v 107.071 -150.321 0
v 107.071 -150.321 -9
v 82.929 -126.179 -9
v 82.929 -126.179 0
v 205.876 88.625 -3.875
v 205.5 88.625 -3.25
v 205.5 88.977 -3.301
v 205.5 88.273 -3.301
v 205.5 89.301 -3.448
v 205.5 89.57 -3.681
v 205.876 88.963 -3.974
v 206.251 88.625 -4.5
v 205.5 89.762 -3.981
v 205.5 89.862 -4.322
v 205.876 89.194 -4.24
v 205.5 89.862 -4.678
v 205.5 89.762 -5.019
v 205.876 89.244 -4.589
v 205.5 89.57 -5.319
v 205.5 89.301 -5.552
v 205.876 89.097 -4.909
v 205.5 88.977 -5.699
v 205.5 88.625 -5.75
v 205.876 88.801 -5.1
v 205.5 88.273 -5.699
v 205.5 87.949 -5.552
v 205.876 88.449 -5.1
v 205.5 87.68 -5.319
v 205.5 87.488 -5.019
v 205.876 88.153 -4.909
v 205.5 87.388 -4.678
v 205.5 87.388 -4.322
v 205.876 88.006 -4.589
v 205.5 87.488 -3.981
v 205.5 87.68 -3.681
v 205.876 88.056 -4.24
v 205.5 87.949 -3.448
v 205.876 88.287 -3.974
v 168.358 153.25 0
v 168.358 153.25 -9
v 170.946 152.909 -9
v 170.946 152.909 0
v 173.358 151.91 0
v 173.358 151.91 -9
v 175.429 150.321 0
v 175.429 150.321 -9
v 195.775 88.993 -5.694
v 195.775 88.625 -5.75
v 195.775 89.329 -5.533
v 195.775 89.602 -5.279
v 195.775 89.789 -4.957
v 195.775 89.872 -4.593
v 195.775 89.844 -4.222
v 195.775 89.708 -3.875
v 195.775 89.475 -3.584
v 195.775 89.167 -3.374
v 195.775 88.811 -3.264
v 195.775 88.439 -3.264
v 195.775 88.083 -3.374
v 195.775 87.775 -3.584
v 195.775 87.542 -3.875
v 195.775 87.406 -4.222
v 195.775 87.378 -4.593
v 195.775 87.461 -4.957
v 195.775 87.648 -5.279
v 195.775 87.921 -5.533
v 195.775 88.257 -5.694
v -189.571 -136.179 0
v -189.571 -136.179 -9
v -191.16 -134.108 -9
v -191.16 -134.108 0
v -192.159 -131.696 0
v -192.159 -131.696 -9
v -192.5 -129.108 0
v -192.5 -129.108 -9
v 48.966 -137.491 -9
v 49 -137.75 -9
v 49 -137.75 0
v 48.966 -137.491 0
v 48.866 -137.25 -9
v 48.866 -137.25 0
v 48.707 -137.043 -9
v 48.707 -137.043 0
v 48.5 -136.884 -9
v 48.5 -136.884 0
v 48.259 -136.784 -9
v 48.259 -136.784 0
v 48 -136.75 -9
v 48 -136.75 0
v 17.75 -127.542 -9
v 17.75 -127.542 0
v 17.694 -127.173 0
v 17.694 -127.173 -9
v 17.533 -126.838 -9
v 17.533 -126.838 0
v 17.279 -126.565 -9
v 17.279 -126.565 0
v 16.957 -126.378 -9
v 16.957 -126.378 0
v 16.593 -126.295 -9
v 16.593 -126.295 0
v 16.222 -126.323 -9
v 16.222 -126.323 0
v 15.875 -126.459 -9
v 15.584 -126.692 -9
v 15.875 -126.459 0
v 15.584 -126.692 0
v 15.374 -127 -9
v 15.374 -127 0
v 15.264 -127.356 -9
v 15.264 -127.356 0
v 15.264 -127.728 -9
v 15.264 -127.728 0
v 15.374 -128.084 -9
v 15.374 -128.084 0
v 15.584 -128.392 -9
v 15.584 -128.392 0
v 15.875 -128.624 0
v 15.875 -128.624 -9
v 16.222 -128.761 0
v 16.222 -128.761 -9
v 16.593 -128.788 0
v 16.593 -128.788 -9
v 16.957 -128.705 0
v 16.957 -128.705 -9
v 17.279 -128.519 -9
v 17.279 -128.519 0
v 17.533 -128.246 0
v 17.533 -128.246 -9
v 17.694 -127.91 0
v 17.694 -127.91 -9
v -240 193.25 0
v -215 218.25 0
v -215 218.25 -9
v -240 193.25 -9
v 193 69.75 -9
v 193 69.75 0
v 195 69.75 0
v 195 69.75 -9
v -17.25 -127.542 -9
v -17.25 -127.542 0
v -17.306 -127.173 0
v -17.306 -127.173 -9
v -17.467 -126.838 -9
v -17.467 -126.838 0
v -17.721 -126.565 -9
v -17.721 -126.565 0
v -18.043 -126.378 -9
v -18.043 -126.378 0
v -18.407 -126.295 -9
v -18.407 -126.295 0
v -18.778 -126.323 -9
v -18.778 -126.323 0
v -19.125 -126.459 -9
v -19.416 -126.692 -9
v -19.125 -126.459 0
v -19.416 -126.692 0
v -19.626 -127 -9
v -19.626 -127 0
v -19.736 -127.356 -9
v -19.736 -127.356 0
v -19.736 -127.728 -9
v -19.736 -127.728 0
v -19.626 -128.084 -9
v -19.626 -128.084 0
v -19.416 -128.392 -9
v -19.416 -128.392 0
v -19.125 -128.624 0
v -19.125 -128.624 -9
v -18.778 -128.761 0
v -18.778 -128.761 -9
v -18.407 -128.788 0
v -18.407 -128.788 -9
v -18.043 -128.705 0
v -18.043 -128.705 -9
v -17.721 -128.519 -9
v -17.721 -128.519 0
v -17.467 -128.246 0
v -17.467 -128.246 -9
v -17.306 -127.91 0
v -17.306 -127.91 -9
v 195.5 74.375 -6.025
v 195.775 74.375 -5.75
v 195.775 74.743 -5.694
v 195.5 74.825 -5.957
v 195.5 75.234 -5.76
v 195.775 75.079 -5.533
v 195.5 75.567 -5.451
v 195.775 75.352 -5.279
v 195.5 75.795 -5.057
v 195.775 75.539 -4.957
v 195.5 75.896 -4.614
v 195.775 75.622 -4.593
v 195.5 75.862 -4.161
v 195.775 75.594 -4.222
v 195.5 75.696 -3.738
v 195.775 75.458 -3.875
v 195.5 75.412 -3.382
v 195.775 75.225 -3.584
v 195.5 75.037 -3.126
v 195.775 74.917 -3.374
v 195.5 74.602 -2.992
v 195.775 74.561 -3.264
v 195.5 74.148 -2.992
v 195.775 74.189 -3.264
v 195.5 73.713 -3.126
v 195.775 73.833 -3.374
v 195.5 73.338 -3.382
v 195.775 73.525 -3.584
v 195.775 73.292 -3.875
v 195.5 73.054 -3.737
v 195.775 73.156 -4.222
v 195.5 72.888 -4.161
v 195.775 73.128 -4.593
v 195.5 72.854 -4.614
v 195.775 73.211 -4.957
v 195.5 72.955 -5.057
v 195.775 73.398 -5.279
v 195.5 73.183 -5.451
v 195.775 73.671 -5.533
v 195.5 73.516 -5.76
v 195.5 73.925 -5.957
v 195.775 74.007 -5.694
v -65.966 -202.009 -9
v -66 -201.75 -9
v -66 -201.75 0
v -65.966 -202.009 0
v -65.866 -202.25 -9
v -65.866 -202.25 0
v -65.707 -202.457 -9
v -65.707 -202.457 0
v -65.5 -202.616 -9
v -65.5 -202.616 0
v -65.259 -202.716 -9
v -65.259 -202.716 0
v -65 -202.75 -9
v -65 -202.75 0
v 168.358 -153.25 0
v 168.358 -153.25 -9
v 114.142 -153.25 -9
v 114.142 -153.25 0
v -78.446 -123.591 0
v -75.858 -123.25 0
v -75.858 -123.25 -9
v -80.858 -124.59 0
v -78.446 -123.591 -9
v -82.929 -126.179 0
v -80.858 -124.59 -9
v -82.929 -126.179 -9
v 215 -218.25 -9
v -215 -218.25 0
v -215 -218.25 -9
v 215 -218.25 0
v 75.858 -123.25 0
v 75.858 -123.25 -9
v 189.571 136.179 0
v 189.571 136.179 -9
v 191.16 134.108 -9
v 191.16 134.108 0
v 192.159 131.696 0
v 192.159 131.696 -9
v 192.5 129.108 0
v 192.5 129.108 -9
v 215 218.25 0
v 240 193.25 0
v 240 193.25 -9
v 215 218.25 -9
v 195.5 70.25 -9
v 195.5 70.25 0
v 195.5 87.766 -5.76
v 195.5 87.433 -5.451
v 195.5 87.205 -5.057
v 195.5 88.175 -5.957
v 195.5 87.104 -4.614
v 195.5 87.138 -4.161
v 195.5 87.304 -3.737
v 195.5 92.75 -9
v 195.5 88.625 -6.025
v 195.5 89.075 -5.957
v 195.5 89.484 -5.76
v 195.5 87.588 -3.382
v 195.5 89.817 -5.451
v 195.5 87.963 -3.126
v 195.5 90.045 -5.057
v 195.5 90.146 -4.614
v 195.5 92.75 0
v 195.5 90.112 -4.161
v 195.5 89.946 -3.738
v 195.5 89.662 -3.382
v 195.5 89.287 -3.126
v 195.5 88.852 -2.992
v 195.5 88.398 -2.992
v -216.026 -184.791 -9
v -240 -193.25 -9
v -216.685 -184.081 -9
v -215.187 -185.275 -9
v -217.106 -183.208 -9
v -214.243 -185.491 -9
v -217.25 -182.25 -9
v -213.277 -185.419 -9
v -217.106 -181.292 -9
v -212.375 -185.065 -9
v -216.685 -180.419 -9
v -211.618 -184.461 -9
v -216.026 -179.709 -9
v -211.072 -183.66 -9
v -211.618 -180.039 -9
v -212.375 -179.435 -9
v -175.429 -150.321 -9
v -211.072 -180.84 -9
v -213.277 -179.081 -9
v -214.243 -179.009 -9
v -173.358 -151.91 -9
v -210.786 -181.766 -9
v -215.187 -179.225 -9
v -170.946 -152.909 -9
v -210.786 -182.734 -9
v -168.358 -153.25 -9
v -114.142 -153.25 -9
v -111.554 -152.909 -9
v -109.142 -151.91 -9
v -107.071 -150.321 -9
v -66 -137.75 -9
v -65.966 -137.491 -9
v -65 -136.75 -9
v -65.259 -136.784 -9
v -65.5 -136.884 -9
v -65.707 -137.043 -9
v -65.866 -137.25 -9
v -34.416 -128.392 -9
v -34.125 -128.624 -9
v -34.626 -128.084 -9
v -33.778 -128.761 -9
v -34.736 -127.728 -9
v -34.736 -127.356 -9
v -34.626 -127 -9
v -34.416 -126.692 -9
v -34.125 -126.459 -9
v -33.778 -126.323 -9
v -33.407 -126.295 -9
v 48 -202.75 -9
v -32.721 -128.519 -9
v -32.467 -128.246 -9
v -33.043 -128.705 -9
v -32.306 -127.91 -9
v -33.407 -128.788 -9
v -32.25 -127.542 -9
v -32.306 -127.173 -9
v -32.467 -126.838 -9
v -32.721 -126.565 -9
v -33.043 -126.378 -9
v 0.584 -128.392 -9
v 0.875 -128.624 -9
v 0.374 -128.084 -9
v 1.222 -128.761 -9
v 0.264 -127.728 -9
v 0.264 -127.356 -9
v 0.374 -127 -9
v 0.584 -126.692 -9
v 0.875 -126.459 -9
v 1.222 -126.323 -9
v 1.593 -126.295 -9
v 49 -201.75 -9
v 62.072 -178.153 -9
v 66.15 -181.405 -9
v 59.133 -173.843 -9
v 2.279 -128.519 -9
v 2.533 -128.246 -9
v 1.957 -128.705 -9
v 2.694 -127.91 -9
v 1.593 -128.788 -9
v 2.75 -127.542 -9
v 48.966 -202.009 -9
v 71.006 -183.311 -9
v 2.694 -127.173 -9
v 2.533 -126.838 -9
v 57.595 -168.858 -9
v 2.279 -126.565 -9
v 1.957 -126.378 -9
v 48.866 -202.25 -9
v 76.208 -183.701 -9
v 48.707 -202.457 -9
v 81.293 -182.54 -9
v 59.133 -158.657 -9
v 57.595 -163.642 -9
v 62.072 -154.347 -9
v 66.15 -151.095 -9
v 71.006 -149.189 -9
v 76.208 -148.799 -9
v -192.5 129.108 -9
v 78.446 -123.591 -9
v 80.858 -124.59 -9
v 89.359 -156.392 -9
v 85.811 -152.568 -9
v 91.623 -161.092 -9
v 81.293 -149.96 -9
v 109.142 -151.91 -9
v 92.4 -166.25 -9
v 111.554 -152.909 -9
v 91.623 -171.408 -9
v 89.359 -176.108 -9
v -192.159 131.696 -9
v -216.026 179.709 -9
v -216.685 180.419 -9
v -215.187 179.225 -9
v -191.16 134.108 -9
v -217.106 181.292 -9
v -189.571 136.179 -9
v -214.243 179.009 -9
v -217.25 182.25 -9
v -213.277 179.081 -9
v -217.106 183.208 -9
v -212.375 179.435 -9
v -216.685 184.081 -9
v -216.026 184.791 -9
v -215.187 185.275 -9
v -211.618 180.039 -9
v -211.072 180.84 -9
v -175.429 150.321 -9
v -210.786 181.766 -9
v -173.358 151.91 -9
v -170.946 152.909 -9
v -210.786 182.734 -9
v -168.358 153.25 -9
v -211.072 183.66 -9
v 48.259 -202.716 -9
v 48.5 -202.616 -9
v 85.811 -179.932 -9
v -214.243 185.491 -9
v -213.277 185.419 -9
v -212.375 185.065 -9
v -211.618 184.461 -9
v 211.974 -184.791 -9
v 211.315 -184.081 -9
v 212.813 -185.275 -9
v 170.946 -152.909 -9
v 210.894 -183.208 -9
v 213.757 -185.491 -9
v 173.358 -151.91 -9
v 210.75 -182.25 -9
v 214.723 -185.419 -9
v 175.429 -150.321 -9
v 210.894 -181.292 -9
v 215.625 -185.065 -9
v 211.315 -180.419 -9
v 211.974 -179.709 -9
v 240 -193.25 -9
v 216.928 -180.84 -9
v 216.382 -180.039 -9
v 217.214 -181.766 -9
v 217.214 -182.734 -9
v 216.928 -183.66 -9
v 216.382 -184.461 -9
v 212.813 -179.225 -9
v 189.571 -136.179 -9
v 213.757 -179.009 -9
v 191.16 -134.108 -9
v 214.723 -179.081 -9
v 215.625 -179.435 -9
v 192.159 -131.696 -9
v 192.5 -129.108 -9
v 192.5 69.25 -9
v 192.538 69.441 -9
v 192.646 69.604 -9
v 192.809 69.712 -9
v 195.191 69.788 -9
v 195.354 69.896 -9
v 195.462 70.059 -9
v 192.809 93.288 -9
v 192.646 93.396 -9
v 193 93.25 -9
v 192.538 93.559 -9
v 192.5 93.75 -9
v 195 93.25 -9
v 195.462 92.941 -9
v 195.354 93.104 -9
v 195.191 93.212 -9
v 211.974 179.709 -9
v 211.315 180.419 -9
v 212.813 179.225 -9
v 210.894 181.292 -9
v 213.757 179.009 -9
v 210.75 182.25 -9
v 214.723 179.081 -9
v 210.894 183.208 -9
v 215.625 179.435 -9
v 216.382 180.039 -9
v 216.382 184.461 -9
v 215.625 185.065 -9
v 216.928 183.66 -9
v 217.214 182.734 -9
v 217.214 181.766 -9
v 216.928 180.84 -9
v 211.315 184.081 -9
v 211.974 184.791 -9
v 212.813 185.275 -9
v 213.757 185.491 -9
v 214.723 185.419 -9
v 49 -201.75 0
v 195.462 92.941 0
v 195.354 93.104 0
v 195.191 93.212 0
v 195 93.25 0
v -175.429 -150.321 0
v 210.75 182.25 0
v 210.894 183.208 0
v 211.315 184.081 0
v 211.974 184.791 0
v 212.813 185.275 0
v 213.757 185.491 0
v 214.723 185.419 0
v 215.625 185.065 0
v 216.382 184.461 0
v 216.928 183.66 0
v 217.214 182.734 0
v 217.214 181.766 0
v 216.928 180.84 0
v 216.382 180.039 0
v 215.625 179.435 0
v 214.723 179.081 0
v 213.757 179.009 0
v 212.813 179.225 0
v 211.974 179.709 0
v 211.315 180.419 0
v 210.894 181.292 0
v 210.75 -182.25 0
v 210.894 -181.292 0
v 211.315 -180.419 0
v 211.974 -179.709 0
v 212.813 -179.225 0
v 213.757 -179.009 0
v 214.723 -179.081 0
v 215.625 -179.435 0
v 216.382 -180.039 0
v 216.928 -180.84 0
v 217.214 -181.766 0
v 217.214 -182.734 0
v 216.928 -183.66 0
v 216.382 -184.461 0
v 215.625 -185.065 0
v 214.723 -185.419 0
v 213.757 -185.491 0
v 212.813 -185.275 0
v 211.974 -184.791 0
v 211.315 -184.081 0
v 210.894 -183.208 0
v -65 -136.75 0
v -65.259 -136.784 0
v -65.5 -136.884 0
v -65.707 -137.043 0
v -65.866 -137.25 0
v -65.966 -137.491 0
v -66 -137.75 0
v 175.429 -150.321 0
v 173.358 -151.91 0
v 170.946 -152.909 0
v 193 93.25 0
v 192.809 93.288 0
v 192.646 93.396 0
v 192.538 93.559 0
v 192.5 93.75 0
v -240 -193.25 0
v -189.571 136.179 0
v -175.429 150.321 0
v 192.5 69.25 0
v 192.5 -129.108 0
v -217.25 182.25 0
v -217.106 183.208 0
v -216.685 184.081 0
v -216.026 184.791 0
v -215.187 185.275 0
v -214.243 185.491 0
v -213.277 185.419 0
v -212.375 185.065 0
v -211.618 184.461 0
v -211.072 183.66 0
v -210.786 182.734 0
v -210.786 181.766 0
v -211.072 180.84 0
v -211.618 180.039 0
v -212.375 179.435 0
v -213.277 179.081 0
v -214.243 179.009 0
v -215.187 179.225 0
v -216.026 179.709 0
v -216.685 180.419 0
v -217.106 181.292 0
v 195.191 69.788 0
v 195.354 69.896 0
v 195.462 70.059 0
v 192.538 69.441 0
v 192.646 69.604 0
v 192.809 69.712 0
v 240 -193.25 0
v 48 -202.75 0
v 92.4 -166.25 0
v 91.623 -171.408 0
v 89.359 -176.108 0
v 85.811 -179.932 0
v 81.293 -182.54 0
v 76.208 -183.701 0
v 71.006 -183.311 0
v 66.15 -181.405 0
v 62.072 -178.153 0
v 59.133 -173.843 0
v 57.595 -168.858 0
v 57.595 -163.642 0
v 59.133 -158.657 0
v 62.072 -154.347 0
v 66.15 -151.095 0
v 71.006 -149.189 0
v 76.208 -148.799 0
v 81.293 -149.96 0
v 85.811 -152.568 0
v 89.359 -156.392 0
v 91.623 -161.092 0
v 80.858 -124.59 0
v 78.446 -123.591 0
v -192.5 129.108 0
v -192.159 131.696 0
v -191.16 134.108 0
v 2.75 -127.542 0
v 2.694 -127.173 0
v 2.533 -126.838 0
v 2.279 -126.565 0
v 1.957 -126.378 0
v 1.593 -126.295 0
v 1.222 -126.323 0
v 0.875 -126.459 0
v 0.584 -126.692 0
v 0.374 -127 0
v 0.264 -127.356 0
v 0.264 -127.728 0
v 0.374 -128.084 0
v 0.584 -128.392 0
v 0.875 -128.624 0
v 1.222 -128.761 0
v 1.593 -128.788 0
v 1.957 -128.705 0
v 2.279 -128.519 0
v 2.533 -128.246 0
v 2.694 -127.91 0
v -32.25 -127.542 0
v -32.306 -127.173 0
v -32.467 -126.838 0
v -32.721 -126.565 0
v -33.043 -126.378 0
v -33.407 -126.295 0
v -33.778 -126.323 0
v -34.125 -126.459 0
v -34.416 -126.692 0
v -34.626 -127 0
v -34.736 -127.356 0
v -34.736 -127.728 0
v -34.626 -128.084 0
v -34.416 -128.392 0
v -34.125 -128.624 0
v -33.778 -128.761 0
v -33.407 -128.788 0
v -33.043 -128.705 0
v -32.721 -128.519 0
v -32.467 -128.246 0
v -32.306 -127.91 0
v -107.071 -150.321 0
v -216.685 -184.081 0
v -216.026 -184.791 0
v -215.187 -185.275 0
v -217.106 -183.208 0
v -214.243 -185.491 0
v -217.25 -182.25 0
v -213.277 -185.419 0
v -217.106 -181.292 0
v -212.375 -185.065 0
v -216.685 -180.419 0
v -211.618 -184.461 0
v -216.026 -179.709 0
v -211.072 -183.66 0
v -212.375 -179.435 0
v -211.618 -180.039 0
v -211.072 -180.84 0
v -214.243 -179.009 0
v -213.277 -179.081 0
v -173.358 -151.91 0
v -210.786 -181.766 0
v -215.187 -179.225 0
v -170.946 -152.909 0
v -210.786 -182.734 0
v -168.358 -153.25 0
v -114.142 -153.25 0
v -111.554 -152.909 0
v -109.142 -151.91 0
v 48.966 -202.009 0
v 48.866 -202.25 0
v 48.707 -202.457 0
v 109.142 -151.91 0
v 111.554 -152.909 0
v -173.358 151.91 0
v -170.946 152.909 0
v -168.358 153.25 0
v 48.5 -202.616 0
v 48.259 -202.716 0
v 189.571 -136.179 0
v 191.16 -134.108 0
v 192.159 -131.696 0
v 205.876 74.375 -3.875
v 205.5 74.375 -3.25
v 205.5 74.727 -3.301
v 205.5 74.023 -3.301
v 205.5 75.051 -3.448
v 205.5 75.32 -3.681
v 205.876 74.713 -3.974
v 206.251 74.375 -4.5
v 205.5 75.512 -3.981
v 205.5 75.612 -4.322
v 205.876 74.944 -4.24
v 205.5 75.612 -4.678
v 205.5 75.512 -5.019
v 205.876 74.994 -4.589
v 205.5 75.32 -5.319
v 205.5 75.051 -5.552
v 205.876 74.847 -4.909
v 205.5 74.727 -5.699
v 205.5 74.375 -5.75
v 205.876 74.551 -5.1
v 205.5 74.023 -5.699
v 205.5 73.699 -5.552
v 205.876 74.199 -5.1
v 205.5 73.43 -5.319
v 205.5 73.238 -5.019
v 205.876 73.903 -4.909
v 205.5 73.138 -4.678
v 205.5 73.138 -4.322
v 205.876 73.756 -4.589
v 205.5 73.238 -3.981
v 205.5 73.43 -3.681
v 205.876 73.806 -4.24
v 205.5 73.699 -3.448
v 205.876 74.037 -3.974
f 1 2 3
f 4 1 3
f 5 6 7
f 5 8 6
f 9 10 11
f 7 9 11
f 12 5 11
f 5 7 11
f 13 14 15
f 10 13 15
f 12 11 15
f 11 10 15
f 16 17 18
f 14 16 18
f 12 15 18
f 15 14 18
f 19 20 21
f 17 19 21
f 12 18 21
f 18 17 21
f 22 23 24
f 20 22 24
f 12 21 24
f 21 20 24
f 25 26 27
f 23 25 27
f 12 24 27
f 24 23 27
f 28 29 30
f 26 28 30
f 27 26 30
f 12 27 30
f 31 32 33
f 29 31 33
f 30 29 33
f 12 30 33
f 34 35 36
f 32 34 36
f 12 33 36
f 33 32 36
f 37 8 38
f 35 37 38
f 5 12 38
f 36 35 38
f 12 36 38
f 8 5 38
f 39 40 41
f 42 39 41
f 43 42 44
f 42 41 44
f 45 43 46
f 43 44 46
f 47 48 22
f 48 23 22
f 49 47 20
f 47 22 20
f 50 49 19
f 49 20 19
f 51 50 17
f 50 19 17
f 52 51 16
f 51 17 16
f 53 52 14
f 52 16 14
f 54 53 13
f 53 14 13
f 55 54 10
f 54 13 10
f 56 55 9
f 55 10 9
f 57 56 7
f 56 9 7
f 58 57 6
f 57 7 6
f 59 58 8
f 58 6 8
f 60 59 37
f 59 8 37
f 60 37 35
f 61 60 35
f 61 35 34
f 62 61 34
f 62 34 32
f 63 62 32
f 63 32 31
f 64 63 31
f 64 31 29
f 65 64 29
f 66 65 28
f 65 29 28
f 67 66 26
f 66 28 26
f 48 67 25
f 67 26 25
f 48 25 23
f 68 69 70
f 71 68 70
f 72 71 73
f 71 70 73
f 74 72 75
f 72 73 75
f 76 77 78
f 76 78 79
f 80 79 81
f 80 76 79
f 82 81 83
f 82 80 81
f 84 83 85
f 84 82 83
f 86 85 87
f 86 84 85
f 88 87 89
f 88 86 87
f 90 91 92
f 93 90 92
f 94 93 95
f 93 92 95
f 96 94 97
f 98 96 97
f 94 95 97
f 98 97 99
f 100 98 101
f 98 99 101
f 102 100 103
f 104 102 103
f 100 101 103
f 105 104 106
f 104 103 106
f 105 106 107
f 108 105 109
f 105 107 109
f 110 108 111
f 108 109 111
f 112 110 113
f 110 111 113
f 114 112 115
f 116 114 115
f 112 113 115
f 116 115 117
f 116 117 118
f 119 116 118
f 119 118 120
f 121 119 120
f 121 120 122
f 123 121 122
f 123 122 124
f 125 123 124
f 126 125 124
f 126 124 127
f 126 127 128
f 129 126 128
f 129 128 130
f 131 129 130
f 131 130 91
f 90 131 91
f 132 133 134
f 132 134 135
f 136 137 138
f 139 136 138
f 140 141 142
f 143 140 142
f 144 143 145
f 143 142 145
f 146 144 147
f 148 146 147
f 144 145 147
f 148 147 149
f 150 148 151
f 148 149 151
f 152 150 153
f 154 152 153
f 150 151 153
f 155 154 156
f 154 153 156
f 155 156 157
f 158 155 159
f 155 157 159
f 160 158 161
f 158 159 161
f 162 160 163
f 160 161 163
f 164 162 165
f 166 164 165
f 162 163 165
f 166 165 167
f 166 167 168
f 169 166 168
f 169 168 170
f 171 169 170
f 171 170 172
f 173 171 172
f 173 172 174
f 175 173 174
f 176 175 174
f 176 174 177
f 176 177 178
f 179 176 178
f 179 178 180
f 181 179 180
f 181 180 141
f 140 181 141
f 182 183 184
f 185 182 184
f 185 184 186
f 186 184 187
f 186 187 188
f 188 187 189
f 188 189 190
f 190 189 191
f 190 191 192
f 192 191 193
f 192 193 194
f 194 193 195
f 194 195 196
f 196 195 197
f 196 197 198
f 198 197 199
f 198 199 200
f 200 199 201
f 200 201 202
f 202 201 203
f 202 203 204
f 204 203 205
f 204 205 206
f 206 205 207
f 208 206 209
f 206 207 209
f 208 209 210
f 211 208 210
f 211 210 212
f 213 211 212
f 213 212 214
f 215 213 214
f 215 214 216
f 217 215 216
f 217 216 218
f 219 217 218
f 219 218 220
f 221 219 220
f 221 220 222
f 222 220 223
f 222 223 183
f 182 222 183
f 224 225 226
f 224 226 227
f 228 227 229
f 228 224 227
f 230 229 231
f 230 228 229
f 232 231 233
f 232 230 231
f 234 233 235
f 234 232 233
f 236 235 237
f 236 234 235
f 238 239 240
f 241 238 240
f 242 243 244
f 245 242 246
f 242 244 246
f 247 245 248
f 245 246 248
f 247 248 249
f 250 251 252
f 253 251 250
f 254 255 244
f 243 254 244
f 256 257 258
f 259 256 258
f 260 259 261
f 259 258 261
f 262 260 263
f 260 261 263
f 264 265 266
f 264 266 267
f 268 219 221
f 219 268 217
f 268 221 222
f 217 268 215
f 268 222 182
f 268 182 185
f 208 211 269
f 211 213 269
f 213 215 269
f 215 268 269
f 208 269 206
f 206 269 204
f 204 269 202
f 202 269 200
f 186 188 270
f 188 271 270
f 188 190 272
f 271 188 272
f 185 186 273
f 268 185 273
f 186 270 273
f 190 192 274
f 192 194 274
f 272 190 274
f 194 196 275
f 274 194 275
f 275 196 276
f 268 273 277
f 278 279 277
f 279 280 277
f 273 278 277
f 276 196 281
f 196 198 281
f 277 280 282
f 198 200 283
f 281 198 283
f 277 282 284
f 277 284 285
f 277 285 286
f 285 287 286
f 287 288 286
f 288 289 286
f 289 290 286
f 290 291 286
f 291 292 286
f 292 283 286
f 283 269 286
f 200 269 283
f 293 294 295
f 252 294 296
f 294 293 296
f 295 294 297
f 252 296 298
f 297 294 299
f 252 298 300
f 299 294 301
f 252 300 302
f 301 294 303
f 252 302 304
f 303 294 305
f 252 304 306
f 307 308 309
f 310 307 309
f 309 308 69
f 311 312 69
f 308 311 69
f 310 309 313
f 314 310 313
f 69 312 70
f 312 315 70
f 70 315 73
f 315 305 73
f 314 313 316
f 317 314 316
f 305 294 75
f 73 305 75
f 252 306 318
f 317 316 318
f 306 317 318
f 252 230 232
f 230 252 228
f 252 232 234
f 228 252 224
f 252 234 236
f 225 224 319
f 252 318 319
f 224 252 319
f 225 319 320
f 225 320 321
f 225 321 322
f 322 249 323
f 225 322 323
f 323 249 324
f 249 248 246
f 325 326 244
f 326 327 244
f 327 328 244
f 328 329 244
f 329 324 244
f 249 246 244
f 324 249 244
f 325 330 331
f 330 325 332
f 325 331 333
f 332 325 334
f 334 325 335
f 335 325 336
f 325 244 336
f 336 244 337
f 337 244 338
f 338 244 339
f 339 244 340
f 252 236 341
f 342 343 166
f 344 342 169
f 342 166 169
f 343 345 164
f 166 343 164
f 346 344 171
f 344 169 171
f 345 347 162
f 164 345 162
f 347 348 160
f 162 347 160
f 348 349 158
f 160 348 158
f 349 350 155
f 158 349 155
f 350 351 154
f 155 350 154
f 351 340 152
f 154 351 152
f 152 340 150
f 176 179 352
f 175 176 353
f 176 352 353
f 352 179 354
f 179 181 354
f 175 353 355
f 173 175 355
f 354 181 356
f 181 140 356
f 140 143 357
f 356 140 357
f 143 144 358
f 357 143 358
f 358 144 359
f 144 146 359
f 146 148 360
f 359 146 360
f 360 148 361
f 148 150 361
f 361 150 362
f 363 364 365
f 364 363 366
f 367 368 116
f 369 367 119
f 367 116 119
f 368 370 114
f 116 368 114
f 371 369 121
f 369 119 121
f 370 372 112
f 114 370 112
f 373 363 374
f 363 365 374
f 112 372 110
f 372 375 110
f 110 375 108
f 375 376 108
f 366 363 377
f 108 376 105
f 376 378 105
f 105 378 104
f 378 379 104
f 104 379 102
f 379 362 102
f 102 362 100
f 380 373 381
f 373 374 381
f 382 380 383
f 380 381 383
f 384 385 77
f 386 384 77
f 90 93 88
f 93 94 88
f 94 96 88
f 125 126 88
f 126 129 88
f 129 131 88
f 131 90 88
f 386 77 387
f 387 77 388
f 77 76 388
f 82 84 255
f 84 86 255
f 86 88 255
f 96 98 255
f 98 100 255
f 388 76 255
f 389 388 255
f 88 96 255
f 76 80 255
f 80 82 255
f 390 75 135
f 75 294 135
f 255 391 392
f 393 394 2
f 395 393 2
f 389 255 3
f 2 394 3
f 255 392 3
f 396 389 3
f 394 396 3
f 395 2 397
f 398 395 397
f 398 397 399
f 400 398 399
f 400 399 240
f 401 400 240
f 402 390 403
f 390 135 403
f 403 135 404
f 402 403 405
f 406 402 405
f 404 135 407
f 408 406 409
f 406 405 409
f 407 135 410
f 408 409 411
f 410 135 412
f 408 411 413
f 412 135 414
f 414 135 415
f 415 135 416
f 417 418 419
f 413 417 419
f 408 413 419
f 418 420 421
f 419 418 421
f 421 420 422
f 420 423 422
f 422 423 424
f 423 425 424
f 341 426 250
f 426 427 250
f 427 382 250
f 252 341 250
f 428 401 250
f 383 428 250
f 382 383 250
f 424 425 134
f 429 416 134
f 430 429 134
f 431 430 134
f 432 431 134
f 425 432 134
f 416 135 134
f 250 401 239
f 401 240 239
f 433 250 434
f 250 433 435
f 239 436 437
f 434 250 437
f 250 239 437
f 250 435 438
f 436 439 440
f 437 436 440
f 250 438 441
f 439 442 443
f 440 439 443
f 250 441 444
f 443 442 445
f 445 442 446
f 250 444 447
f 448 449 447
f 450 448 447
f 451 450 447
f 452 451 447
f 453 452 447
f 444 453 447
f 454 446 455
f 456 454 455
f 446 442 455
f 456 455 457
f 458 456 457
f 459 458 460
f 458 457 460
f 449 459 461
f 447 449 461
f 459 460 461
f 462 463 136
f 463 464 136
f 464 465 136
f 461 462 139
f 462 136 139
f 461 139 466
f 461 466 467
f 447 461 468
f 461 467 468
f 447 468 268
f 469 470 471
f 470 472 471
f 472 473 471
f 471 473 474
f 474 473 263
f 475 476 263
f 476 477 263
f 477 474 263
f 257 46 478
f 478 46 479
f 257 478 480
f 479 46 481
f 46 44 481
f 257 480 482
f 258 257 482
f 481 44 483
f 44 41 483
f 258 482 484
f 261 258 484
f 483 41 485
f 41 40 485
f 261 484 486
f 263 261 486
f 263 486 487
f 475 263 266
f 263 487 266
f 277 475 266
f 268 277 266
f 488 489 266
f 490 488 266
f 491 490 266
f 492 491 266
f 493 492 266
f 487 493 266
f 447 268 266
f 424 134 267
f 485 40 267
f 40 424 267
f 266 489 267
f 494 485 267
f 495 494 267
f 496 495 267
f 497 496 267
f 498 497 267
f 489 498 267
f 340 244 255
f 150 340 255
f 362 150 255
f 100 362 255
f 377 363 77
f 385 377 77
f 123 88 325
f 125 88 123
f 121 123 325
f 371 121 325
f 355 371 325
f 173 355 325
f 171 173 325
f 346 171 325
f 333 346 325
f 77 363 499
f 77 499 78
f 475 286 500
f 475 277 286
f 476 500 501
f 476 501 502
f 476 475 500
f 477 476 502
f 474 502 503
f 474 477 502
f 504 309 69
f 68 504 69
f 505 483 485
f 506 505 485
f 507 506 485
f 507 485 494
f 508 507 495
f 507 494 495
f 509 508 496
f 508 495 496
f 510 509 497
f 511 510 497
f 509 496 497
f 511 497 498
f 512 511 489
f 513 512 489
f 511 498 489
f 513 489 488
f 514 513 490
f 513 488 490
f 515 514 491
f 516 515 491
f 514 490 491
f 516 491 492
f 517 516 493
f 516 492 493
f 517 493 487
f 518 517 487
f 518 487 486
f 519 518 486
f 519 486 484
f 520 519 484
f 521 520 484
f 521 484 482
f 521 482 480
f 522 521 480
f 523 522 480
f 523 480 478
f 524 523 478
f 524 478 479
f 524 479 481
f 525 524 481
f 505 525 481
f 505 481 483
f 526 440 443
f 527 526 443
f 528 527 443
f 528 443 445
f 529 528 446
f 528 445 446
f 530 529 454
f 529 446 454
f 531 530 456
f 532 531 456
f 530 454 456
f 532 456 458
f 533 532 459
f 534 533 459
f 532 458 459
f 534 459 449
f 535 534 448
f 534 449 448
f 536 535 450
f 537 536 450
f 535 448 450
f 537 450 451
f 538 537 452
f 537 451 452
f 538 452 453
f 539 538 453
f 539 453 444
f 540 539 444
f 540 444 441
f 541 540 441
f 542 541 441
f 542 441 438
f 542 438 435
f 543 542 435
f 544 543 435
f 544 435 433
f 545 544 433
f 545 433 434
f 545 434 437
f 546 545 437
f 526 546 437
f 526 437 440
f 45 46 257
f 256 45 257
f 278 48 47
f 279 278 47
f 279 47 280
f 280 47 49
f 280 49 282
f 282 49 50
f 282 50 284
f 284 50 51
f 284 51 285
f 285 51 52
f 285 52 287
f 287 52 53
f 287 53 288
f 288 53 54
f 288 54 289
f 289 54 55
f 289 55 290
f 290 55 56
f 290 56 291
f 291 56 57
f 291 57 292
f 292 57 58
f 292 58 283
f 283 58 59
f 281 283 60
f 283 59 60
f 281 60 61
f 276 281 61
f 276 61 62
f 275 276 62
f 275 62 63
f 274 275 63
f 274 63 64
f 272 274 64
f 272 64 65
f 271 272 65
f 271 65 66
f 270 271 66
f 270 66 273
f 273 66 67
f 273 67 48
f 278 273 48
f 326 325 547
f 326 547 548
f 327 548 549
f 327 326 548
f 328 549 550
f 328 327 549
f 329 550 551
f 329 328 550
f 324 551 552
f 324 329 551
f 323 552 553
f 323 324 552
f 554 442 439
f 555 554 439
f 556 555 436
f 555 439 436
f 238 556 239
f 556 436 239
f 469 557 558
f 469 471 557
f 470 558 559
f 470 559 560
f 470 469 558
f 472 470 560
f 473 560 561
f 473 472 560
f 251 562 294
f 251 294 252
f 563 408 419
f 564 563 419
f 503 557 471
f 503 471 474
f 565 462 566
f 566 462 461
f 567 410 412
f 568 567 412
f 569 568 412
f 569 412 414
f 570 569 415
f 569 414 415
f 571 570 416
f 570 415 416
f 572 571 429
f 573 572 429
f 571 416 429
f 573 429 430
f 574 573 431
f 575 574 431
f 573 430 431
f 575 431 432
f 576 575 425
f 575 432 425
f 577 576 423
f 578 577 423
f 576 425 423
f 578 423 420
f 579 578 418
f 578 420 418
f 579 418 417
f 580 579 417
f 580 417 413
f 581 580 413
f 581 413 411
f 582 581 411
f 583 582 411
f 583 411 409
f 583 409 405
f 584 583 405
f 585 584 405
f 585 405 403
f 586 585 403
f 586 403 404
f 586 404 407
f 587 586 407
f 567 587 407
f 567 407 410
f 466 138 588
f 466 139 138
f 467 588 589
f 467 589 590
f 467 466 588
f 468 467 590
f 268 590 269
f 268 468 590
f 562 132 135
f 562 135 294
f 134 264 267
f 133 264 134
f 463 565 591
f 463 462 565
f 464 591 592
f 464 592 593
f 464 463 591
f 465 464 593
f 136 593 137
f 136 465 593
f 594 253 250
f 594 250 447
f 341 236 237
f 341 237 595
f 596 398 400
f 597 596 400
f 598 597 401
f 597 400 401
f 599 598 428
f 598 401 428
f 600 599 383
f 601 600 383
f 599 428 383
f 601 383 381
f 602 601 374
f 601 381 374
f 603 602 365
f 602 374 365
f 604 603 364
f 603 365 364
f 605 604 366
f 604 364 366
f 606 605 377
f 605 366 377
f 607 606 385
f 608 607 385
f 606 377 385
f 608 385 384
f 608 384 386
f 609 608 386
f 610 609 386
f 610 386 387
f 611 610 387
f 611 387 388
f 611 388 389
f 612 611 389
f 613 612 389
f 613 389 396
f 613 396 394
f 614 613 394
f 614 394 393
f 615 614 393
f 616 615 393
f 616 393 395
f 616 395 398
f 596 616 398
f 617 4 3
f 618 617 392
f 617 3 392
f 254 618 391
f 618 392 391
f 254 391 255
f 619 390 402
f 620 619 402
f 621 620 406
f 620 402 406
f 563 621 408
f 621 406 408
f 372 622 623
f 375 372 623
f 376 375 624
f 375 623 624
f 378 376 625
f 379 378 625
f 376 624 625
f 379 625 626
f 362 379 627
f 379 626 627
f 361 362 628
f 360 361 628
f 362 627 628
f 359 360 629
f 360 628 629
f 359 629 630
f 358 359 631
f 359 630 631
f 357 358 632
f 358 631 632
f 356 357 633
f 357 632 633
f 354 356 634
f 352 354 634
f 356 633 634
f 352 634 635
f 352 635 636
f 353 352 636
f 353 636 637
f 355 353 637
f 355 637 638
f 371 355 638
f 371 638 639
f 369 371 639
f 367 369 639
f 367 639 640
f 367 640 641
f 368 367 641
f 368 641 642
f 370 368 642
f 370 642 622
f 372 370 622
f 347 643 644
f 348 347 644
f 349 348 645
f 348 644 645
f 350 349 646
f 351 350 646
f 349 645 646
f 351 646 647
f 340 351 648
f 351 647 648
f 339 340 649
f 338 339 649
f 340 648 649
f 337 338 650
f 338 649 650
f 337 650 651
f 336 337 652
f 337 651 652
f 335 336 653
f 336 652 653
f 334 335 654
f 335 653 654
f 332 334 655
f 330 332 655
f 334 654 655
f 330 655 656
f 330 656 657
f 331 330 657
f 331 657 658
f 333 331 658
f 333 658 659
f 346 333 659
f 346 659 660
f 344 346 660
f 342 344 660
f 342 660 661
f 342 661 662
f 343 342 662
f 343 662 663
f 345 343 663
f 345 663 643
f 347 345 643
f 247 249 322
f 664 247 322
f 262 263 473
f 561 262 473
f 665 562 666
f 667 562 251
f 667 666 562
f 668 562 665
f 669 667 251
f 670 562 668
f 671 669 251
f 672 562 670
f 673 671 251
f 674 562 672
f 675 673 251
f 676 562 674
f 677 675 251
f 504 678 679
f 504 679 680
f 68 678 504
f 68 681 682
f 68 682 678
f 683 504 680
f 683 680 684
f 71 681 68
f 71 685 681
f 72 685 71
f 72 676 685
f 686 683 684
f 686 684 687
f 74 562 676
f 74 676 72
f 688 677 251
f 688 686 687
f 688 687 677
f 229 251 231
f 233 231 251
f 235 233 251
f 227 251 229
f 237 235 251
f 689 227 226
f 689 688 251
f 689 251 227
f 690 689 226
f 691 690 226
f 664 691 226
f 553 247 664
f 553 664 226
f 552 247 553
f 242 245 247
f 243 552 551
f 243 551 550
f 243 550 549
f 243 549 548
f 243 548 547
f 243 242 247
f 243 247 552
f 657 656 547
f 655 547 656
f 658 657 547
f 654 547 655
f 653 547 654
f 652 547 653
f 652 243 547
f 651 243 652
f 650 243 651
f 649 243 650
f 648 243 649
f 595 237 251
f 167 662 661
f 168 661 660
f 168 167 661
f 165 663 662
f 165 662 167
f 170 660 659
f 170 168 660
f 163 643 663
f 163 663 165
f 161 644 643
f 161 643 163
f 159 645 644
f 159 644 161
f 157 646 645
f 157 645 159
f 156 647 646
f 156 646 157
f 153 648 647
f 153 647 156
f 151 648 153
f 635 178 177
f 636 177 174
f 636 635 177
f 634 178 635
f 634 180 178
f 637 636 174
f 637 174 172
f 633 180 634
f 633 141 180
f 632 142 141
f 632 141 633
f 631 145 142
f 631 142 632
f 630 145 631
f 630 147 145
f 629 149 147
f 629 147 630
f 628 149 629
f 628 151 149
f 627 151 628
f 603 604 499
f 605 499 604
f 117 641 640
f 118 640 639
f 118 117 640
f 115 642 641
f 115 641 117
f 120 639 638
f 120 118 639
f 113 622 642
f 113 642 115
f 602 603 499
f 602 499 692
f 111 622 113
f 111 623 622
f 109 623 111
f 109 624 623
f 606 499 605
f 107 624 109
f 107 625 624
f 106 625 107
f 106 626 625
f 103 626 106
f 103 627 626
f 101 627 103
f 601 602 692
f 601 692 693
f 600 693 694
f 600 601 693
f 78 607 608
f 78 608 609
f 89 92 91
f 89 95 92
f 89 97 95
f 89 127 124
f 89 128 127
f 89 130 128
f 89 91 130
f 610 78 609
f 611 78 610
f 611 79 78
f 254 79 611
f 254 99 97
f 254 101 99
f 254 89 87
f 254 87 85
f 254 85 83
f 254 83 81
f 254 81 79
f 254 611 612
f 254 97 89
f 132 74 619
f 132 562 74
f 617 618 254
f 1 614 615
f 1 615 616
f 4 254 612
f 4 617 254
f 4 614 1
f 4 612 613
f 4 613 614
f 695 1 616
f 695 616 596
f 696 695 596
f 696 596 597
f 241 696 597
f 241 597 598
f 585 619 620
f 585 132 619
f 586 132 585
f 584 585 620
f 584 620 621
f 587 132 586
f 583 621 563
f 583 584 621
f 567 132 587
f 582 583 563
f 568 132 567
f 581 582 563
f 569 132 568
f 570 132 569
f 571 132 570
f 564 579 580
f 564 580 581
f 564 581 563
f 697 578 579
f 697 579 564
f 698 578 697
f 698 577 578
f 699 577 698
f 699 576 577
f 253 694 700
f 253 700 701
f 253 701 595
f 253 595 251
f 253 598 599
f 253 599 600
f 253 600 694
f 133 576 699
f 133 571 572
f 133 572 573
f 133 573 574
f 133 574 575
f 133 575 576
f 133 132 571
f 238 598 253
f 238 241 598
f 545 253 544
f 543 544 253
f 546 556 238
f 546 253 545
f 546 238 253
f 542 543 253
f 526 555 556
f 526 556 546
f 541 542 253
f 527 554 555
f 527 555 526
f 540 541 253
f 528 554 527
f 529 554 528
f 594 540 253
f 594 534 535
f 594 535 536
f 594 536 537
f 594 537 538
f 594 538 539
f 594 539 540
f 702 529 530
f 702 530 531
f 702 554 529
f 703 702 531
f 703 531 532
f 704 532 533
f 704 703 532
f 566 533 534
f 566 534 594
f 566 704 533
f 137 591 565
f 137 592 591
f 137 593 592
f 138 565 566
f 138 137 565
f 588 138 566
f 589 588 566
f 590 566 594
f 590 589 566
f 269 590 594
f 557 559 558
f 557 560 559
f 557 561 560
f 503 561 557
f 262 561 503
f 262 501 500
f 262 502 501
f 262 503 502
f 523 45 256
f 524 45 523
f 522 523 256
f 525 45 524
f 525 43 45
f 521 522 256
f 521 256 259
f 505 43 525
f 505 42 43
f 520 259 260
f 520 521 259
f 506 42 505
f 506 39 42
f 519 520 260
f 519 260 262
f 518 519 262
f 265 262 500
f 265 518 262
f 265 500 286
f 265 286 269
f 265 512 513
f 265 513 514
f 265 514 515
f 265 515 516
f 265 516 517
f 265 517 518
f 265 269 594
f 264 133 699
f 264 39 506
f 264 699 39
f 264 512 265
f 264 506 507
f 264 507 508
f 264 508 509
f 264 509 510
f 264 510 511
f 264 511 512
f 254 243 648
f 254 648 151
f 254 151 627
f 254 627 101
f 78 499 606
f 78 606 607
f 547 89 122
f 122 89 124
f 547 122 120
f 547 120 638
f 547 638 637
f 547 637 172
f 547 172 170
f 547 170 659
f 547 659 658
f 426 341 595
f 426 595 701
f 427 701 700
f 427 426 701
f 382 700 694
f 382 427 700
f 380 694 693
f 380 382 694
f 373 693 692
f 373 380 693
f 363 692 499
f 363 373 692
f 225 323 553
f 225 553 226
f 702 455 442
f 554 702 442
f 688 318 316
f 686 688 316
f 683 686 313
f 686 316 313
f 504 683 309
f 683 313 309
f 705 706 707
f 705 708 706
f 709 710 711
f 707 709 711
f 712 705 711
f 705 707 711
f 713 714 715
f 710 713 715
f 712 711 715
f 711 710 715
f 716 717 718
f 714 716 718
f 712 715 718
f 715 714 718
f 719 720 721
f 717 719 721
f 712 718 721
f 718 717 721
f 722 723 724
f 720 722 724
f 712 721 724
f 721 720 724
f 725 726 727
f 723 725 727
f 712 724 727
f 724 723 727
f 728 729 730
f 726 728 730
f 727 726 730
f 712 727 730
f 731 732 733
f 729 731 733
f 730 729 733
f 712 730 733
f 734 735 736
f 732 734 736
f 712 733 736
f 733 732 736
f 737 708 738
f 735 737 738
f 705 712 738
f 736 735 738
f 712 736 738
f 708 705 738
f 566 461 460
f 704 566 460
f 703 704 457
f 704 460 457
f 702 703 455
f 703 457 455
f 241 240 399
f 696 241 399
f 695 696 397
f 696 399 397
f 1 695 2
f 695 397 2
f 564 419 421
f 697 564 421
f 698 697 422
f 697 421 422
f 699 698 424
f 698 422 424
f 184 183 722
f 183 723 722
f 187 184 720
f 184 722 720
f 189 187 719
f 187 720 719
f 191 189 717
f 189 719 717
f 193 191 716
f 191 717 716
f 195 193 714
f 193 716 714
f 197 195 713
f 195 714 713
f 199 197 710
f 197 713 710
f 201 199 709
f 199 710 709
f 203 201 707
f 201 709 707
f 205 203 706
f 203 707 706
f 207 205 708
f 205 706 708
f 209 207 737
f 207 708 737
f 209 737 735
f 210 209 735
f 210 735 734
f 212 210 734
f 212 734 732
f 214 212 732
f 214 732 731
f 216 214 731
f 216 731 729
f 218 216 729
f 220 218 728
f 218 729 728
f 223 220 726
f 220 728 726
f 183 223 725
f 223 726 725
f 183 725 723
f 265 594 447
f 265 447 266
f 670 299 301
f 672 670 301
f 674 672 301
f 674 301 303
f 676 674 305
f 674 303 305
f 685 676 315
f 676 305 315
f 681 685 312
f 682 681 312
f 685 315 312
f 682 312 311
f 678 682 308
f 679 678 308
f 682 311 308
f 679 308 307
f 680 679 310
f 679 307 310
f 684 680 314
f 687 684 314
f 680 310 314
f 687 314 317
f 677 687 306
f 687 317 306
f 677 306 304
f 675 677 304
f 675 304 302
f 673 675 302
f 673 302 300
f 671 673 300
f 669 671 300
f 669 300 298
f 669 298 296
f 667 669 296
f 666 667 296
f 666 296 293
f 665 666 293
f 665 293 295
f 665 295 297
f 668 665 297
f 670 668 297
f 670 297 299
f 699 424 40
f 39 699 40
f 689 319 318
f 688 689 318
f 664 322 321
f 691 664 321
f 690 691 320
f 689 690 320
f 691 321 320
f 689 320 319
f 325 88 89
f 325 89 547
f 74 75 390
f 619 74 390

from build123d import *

# Parameters (mm, degrees)
BOSS_EXTRUDE1_DEPTH         = 9
CUT_EXTRUDE1_DEPTH          = 325.521282045
CUT_EXTRUDE2_DEPTH          = 325.521282045
SKETCH6_R                   = 17.5
CUT_EXTRUDE3_DEPTH          = 325.521282045
F_6_5_6_5_DIAMETER_HOLE1_D  = 6.5
CUT_EXTRUDE4_REACH          = 326.521
CUT_EXTRUDE5_REACH          = 326.521
SKETCH8_R                   = 1.25
CUT_EXTRUDE6_REACH          = 326.521
SKETCH9_W                   = 3
SKETCH9_H                   = 23.5
FILLET1_R                   = 0.5
M3_TAPPED_HOLE1_D           = 2.5
M3_TAPPED_HOLE1_DEPTH       = 10
M3_TAPPED_HOLE1_CSINK_D     = 3.05
M3_TAPPED_HOLE1_CSINK_ANGLE = 90
M3_TAPPED_HOLE1_TIP         = 0.751075774


with BuildPart() as part:
    # Sketch1 → Boss-Extrude1 (new body)
    with BuildSketch(Plane.XY):
        Polygon((-240, -193.25), (-215, -218.25), (215, -218.25), (240, -193.25), (240, 193.25), (215, 218.25), (-215, 218.25), (-240, 193.25), align=None)
    extrude(amount=-BOSS_EXTRUDE1_DEPTH)

    # Sketch2 → Cut-Extrude1 (cut, through all)
    with BuildSketch(Plane(origin=(0, 0, -9), x_dir=(-1, 0, 0), z_dir=(0, 0, -1))):
        with BuildLine():
            Line((114.142135624, -153.25), (168.357864376, -153.25))
            ThreePointArc((168.357864376, -153.25), (172.1846987, -152.488795325), (175.428932188, -150.321067812))
            Line((175.428932188, -150.321067812), (189.571067812, -136.178932188))
            ThreePointArc((189.571067812, -136.178932188), (191.738795325, -132.9346987), (192.5, -129.107864376))
            Line((192.5, -129.107864376), (192.5, 129.107864376))
            ThreePointArc((192.5, 129.107864376), (191.738795325, 132.9346987), (189.571067812, 136.178932188))
            Line((189.571067812, 136.178932188), (175.428932188, 150.321067812))
            ThreePointArc((175.428932188, 150.321067812), (172.1846987, 152.488795325), (168.357864376, 153.25))
            Line((168.357864376, 153.25), (-168.357864376, 153.25))
            ThreePointArc((-168.357864376, 153.25), (-172.1846987, 152.488795325), (-175.428932188, 150.321067812))
            Line((-175.428932188, 150.321067812), (-189.571067812, 136.178932188))
            ThreePointArc((-189.571067812, 136.178932188), (-191.738795325, 132.9346987), (-192.5, 129.107864376))
            Line((-192.5, 129.107864376), (-192.5, -129.107864376))
            ThreePointArc((-192.5, -129.107864376), (-191.738795325, -132.9346987), (-189.571067812, -136.178932188))
            Line((-189.571067812, -136.178932188), (-175.428932188, -150.321067812))
            ThreePointArc((-175.428932188, -150.321067812), (-172.1846987, -152.488795325), (-168.357864376, -153.25))
            Line((-168.357864376, -153.25), (-114.142135624, -153.25))
            ThreePointArc((-114.142135624, -153.25), (-110.3153013, -152.488795325), (-107.071067812, -150.321067812))
            Line((-107.071067812, -150.321067812), (-82.928932183, -126.178932183))
            ThreePointArc((-82.928932183, -126.178932183), (-79.684698695, -124.01120467), (-75.857864371, -123.249999995))
            Line((-75.857864371, -123.249999995), (75.857864371, -123.249999995))
            ThreePointArc((75.857864371, -123.249999995), (79.684698695, -124.01120467), (82.928932183, -126.178932183))
            Line((82.928932183, -126.178932183), (107.071067812, -150.321067812))
            ThreePointArc((107.071067812, -150.321067812), (110.3153013, -152.488795325), (114.142135624, -153.25))
        make_face()
    extrude(amount=-CUT_EXTRUDE1_DEPTH, mode=Mode.SUBTRACT)

    # Sketch3 → Cut-Extrude2 (cut, through all)
    with BuildSketch(Plane(origin=(0, 0, -9), x_dir=(-1, 0, 0), z_dir=(0, 0, -1))):
        with BuildLine():
            Line((48, -149.249999995), (-48, -149.249999995))
            ThreePointArc((-48, -149.249999995), (-48.707106781, -149.542893214), (-49, -150.249999995))
            Line((-49, -150.249999995), (-49, -189.249999995))
            ThreePointArc((-49, -189.249999995), (-48.707106781, -189.957106776), (-48, -190.249999995))
            Line((-48, -190.249999995), (48, -190.249999995))
            ThreePointArc((48, -190.249999995), (48.707106781, -189.957106776), (49, -189.249999995))
            Line((49, -189.249999995), (49, -150.249999995))
            ThreePointArc((49, -150.249999995), (48.707106781, -149.542893214), (48, -149.249999995))
        make_face()
    extrude(amount=-CUT_EXTRUDE2_DEPTH, mode=Mode.SUBTRACT)

    # Sketch6 → Cut-Extrude3 (cut, through all)
    with BuildSketch(Plane(origin=(0, 0, -9), x_dir=(-1, 0, 0), z_dir=(0, 0, -1))):
        with Locations(Location((-74.9, -166.249999995, 0), (0, 0, 180))):
            Circle(SKETCH6_R)
    extrude(amount=-CUT_EXTRUDE3_DEPTH, mode=Mode.SUBTRACT)

    # Ø6.5 (6.5) Diameter Hole1 (through all)
    with Locations(Plane.XY):
        with Locations((214, -182.25), (-214, -182.25), (-214, 182.25), (214, 182.25)):
            Hole(F_6_5_6_5_DIAMETER_HOLE1_D / 2)

    # Sketch7 → Cut-Extrude4 (cut, up to next)
    with BuildSketch(Plane(origin=(0, 0, -9), x_dir=(-1, 0, 0), z_dir=(0, 0, -1)), mode=Mode.PRIVATE) as cut_extrude4_sk1:
        with BuildLine():
            Line((-48, -136.75), (65, -136.75))
            ThreePointArc((65, -136.75), (65.707106781, -137.042893219), (66, -137.75))
            Line((66, -137.75), (66, -201.75))
            ThreePointArc((66, -201.75), (65.707106781, -202.457106781), (65, -202.75))
            Line((65, -202.75), (-48, -202.75))
            ThreePointArc((-48, -202.75), (-48.707106781, -202.457106781), (-49, -201.75))
            Line((-49, -201.75), (-49, -137.75))
            ThreePointArc((-49, -137.75), (-48.707106781, -137.042893219), (-48, -136.75))
        make_face()
    cut_extrude4_tool1 = extrude(cut_extrude4_sk1.sketch, amount=-CUT_EXTRUDE4_REACH, mode=Mode.PRIVATE) & part.part
    add(cut_extrude4_tool1.solids().sort_by_distance((-8.5, -169.75, -9))[0], mode=Mode.SUBTRACT)

    # Sketch8 → Cut-Extrude5 (cut, up to next)
    with BuildSketch(Plane.XY, mode=Mode.PRIVATE) as cut_extrude5_sk1:
        with Locations((-33.5, -127.541900756)):
            Circle(SKETCH8_R)
    cut_extrude5_tool1 = extrude(cut_extrude5_sk1.sketch, amount=-CUT_EXTRUDE5_REACH, mode=Mode.PRIVATE) & part.part
    # Sketch8 → Cut-Extrude5 (cut, up to next)
    with BuildSketch(Plane.XY, mode=Mode.PRIVATE) as cut_extrude5_sk2:
        with Locations((-18.5, -127.541900756)):
            Circle(SKETCH8_R)
    cut_extrude5_tool2 = extrude(cut_extrude5_sk2.sketch, amount=-CUT_EXTRUDE5_REACH, mode=Mode.PRIVATE) & part.part
    # Sketch8 → Cut-Extrude5 (cut, up to next)
    with BuildSketch(Plane.XY, mode=Mode.PRIVATE) as cut_extrude5_sk3:
        with Locations((1.5, -127.541900756)):
            Circle(SKETCH8_R)
    cut_extrude5_tool3 = extrude(cut_extrude5_sk3.sketch, amount=-CUT_EXTRUDE5_REACH, mode=Mode.PRIVATE) & part.part
    # Sketch8 → Cut-Extrude5 (cut, up to next)
    with BuildSketch(Plane.XY, mode=Mode.PRIVATE) as cut_extrude5_sk4:
        with Locations((16.5, -127.541900756)):
            Circle(SKETCH8_R)
    cut_extrude5_tool4 = extrude(cut_extrude5_sk4.sketch, amount=-CUT_EXTRUDE5_REACH, mode=Mode.PRIVATE) & part.part
    add(cut_extrude5_tool1.solids().sort_by_distance((-33.5, -127.541901, 0))[0], mode=Mode.SUBTRACT)
    add(cut_extrude5_tool2.solids().sort_by_distance((-18.5, -127.541901, 0))[0], mode=Mode.SUBTRACT)
    add(cut_extrude5_tool3.solids().sort_by_distance((1.5, -127.541901, 0))[0], mode=Mode.SUBTRACT)
    add(cut_extrude5_tool4.solids().sort_by_distance((16.5, -127.541901, 0))[0], mode=Mode.SUBTRACT)

    # Sketch9 → Cut-Extrude6 (cut, up to next)
    with BuildSketch(Plane.XY, mode=Mode.PRIVATE) as cut_extrude6_sk1:
        with Locations((194, 81.5)):
            Rectangle(SKETCH9_W, SKETCH9_H)
    cut_extrude6_tool1 = extrude(cut_extrude6_sk1.sketch, amount=-CUT_EXTRUDE6_REACH, mode=Mode.PRIVATE) & part.part
    add(cut_extrude6_tool1.solids().sort_by_distance((194, 81.5, 0))[0], mode=Mode.SUBTRACT)

    # Fillet1
    fillet1_edges = [part.edges().sort_by_distance(p)[0] for p in [
        (192.5, 69.75, -4.5),
        (192.5, 93.25, -4.5),
        (195.5, 93.25, -4.5),
        (195.5, 69.75, -4.5),
    ]]
    fillet(fillet1_edges, radius=FILLET1_R)

    # M3 Tapped Hole1
    with Locations(Plane.ZY.offset(-195.5)):
        with Locations((-4.5, 88.625), (-4.5, 74.375)):
            CounterSinkHole(M3_TAPPED_HOLE1_D / 2, M3_TAPPED_HOLE1_CSINK_D / 2, depth=M3_TAPPED_HOLE1_DEPTH, counter_sink_angle=M3_TAPPED_HOLE1_CSINK_ANGLE)
            with Locations((0, 0, -(M3_TAPPED_HOLE1_DEPTH + M3_TAPPED_HOLE1_TIP / 2))):  # 118° drill point
                Cone(0, M3_TAPPED_HOLE1_D / 2, M3_TAPPED_HOLE1_TIP, mode=Mode.SUBTRACT)


solid = part.part
